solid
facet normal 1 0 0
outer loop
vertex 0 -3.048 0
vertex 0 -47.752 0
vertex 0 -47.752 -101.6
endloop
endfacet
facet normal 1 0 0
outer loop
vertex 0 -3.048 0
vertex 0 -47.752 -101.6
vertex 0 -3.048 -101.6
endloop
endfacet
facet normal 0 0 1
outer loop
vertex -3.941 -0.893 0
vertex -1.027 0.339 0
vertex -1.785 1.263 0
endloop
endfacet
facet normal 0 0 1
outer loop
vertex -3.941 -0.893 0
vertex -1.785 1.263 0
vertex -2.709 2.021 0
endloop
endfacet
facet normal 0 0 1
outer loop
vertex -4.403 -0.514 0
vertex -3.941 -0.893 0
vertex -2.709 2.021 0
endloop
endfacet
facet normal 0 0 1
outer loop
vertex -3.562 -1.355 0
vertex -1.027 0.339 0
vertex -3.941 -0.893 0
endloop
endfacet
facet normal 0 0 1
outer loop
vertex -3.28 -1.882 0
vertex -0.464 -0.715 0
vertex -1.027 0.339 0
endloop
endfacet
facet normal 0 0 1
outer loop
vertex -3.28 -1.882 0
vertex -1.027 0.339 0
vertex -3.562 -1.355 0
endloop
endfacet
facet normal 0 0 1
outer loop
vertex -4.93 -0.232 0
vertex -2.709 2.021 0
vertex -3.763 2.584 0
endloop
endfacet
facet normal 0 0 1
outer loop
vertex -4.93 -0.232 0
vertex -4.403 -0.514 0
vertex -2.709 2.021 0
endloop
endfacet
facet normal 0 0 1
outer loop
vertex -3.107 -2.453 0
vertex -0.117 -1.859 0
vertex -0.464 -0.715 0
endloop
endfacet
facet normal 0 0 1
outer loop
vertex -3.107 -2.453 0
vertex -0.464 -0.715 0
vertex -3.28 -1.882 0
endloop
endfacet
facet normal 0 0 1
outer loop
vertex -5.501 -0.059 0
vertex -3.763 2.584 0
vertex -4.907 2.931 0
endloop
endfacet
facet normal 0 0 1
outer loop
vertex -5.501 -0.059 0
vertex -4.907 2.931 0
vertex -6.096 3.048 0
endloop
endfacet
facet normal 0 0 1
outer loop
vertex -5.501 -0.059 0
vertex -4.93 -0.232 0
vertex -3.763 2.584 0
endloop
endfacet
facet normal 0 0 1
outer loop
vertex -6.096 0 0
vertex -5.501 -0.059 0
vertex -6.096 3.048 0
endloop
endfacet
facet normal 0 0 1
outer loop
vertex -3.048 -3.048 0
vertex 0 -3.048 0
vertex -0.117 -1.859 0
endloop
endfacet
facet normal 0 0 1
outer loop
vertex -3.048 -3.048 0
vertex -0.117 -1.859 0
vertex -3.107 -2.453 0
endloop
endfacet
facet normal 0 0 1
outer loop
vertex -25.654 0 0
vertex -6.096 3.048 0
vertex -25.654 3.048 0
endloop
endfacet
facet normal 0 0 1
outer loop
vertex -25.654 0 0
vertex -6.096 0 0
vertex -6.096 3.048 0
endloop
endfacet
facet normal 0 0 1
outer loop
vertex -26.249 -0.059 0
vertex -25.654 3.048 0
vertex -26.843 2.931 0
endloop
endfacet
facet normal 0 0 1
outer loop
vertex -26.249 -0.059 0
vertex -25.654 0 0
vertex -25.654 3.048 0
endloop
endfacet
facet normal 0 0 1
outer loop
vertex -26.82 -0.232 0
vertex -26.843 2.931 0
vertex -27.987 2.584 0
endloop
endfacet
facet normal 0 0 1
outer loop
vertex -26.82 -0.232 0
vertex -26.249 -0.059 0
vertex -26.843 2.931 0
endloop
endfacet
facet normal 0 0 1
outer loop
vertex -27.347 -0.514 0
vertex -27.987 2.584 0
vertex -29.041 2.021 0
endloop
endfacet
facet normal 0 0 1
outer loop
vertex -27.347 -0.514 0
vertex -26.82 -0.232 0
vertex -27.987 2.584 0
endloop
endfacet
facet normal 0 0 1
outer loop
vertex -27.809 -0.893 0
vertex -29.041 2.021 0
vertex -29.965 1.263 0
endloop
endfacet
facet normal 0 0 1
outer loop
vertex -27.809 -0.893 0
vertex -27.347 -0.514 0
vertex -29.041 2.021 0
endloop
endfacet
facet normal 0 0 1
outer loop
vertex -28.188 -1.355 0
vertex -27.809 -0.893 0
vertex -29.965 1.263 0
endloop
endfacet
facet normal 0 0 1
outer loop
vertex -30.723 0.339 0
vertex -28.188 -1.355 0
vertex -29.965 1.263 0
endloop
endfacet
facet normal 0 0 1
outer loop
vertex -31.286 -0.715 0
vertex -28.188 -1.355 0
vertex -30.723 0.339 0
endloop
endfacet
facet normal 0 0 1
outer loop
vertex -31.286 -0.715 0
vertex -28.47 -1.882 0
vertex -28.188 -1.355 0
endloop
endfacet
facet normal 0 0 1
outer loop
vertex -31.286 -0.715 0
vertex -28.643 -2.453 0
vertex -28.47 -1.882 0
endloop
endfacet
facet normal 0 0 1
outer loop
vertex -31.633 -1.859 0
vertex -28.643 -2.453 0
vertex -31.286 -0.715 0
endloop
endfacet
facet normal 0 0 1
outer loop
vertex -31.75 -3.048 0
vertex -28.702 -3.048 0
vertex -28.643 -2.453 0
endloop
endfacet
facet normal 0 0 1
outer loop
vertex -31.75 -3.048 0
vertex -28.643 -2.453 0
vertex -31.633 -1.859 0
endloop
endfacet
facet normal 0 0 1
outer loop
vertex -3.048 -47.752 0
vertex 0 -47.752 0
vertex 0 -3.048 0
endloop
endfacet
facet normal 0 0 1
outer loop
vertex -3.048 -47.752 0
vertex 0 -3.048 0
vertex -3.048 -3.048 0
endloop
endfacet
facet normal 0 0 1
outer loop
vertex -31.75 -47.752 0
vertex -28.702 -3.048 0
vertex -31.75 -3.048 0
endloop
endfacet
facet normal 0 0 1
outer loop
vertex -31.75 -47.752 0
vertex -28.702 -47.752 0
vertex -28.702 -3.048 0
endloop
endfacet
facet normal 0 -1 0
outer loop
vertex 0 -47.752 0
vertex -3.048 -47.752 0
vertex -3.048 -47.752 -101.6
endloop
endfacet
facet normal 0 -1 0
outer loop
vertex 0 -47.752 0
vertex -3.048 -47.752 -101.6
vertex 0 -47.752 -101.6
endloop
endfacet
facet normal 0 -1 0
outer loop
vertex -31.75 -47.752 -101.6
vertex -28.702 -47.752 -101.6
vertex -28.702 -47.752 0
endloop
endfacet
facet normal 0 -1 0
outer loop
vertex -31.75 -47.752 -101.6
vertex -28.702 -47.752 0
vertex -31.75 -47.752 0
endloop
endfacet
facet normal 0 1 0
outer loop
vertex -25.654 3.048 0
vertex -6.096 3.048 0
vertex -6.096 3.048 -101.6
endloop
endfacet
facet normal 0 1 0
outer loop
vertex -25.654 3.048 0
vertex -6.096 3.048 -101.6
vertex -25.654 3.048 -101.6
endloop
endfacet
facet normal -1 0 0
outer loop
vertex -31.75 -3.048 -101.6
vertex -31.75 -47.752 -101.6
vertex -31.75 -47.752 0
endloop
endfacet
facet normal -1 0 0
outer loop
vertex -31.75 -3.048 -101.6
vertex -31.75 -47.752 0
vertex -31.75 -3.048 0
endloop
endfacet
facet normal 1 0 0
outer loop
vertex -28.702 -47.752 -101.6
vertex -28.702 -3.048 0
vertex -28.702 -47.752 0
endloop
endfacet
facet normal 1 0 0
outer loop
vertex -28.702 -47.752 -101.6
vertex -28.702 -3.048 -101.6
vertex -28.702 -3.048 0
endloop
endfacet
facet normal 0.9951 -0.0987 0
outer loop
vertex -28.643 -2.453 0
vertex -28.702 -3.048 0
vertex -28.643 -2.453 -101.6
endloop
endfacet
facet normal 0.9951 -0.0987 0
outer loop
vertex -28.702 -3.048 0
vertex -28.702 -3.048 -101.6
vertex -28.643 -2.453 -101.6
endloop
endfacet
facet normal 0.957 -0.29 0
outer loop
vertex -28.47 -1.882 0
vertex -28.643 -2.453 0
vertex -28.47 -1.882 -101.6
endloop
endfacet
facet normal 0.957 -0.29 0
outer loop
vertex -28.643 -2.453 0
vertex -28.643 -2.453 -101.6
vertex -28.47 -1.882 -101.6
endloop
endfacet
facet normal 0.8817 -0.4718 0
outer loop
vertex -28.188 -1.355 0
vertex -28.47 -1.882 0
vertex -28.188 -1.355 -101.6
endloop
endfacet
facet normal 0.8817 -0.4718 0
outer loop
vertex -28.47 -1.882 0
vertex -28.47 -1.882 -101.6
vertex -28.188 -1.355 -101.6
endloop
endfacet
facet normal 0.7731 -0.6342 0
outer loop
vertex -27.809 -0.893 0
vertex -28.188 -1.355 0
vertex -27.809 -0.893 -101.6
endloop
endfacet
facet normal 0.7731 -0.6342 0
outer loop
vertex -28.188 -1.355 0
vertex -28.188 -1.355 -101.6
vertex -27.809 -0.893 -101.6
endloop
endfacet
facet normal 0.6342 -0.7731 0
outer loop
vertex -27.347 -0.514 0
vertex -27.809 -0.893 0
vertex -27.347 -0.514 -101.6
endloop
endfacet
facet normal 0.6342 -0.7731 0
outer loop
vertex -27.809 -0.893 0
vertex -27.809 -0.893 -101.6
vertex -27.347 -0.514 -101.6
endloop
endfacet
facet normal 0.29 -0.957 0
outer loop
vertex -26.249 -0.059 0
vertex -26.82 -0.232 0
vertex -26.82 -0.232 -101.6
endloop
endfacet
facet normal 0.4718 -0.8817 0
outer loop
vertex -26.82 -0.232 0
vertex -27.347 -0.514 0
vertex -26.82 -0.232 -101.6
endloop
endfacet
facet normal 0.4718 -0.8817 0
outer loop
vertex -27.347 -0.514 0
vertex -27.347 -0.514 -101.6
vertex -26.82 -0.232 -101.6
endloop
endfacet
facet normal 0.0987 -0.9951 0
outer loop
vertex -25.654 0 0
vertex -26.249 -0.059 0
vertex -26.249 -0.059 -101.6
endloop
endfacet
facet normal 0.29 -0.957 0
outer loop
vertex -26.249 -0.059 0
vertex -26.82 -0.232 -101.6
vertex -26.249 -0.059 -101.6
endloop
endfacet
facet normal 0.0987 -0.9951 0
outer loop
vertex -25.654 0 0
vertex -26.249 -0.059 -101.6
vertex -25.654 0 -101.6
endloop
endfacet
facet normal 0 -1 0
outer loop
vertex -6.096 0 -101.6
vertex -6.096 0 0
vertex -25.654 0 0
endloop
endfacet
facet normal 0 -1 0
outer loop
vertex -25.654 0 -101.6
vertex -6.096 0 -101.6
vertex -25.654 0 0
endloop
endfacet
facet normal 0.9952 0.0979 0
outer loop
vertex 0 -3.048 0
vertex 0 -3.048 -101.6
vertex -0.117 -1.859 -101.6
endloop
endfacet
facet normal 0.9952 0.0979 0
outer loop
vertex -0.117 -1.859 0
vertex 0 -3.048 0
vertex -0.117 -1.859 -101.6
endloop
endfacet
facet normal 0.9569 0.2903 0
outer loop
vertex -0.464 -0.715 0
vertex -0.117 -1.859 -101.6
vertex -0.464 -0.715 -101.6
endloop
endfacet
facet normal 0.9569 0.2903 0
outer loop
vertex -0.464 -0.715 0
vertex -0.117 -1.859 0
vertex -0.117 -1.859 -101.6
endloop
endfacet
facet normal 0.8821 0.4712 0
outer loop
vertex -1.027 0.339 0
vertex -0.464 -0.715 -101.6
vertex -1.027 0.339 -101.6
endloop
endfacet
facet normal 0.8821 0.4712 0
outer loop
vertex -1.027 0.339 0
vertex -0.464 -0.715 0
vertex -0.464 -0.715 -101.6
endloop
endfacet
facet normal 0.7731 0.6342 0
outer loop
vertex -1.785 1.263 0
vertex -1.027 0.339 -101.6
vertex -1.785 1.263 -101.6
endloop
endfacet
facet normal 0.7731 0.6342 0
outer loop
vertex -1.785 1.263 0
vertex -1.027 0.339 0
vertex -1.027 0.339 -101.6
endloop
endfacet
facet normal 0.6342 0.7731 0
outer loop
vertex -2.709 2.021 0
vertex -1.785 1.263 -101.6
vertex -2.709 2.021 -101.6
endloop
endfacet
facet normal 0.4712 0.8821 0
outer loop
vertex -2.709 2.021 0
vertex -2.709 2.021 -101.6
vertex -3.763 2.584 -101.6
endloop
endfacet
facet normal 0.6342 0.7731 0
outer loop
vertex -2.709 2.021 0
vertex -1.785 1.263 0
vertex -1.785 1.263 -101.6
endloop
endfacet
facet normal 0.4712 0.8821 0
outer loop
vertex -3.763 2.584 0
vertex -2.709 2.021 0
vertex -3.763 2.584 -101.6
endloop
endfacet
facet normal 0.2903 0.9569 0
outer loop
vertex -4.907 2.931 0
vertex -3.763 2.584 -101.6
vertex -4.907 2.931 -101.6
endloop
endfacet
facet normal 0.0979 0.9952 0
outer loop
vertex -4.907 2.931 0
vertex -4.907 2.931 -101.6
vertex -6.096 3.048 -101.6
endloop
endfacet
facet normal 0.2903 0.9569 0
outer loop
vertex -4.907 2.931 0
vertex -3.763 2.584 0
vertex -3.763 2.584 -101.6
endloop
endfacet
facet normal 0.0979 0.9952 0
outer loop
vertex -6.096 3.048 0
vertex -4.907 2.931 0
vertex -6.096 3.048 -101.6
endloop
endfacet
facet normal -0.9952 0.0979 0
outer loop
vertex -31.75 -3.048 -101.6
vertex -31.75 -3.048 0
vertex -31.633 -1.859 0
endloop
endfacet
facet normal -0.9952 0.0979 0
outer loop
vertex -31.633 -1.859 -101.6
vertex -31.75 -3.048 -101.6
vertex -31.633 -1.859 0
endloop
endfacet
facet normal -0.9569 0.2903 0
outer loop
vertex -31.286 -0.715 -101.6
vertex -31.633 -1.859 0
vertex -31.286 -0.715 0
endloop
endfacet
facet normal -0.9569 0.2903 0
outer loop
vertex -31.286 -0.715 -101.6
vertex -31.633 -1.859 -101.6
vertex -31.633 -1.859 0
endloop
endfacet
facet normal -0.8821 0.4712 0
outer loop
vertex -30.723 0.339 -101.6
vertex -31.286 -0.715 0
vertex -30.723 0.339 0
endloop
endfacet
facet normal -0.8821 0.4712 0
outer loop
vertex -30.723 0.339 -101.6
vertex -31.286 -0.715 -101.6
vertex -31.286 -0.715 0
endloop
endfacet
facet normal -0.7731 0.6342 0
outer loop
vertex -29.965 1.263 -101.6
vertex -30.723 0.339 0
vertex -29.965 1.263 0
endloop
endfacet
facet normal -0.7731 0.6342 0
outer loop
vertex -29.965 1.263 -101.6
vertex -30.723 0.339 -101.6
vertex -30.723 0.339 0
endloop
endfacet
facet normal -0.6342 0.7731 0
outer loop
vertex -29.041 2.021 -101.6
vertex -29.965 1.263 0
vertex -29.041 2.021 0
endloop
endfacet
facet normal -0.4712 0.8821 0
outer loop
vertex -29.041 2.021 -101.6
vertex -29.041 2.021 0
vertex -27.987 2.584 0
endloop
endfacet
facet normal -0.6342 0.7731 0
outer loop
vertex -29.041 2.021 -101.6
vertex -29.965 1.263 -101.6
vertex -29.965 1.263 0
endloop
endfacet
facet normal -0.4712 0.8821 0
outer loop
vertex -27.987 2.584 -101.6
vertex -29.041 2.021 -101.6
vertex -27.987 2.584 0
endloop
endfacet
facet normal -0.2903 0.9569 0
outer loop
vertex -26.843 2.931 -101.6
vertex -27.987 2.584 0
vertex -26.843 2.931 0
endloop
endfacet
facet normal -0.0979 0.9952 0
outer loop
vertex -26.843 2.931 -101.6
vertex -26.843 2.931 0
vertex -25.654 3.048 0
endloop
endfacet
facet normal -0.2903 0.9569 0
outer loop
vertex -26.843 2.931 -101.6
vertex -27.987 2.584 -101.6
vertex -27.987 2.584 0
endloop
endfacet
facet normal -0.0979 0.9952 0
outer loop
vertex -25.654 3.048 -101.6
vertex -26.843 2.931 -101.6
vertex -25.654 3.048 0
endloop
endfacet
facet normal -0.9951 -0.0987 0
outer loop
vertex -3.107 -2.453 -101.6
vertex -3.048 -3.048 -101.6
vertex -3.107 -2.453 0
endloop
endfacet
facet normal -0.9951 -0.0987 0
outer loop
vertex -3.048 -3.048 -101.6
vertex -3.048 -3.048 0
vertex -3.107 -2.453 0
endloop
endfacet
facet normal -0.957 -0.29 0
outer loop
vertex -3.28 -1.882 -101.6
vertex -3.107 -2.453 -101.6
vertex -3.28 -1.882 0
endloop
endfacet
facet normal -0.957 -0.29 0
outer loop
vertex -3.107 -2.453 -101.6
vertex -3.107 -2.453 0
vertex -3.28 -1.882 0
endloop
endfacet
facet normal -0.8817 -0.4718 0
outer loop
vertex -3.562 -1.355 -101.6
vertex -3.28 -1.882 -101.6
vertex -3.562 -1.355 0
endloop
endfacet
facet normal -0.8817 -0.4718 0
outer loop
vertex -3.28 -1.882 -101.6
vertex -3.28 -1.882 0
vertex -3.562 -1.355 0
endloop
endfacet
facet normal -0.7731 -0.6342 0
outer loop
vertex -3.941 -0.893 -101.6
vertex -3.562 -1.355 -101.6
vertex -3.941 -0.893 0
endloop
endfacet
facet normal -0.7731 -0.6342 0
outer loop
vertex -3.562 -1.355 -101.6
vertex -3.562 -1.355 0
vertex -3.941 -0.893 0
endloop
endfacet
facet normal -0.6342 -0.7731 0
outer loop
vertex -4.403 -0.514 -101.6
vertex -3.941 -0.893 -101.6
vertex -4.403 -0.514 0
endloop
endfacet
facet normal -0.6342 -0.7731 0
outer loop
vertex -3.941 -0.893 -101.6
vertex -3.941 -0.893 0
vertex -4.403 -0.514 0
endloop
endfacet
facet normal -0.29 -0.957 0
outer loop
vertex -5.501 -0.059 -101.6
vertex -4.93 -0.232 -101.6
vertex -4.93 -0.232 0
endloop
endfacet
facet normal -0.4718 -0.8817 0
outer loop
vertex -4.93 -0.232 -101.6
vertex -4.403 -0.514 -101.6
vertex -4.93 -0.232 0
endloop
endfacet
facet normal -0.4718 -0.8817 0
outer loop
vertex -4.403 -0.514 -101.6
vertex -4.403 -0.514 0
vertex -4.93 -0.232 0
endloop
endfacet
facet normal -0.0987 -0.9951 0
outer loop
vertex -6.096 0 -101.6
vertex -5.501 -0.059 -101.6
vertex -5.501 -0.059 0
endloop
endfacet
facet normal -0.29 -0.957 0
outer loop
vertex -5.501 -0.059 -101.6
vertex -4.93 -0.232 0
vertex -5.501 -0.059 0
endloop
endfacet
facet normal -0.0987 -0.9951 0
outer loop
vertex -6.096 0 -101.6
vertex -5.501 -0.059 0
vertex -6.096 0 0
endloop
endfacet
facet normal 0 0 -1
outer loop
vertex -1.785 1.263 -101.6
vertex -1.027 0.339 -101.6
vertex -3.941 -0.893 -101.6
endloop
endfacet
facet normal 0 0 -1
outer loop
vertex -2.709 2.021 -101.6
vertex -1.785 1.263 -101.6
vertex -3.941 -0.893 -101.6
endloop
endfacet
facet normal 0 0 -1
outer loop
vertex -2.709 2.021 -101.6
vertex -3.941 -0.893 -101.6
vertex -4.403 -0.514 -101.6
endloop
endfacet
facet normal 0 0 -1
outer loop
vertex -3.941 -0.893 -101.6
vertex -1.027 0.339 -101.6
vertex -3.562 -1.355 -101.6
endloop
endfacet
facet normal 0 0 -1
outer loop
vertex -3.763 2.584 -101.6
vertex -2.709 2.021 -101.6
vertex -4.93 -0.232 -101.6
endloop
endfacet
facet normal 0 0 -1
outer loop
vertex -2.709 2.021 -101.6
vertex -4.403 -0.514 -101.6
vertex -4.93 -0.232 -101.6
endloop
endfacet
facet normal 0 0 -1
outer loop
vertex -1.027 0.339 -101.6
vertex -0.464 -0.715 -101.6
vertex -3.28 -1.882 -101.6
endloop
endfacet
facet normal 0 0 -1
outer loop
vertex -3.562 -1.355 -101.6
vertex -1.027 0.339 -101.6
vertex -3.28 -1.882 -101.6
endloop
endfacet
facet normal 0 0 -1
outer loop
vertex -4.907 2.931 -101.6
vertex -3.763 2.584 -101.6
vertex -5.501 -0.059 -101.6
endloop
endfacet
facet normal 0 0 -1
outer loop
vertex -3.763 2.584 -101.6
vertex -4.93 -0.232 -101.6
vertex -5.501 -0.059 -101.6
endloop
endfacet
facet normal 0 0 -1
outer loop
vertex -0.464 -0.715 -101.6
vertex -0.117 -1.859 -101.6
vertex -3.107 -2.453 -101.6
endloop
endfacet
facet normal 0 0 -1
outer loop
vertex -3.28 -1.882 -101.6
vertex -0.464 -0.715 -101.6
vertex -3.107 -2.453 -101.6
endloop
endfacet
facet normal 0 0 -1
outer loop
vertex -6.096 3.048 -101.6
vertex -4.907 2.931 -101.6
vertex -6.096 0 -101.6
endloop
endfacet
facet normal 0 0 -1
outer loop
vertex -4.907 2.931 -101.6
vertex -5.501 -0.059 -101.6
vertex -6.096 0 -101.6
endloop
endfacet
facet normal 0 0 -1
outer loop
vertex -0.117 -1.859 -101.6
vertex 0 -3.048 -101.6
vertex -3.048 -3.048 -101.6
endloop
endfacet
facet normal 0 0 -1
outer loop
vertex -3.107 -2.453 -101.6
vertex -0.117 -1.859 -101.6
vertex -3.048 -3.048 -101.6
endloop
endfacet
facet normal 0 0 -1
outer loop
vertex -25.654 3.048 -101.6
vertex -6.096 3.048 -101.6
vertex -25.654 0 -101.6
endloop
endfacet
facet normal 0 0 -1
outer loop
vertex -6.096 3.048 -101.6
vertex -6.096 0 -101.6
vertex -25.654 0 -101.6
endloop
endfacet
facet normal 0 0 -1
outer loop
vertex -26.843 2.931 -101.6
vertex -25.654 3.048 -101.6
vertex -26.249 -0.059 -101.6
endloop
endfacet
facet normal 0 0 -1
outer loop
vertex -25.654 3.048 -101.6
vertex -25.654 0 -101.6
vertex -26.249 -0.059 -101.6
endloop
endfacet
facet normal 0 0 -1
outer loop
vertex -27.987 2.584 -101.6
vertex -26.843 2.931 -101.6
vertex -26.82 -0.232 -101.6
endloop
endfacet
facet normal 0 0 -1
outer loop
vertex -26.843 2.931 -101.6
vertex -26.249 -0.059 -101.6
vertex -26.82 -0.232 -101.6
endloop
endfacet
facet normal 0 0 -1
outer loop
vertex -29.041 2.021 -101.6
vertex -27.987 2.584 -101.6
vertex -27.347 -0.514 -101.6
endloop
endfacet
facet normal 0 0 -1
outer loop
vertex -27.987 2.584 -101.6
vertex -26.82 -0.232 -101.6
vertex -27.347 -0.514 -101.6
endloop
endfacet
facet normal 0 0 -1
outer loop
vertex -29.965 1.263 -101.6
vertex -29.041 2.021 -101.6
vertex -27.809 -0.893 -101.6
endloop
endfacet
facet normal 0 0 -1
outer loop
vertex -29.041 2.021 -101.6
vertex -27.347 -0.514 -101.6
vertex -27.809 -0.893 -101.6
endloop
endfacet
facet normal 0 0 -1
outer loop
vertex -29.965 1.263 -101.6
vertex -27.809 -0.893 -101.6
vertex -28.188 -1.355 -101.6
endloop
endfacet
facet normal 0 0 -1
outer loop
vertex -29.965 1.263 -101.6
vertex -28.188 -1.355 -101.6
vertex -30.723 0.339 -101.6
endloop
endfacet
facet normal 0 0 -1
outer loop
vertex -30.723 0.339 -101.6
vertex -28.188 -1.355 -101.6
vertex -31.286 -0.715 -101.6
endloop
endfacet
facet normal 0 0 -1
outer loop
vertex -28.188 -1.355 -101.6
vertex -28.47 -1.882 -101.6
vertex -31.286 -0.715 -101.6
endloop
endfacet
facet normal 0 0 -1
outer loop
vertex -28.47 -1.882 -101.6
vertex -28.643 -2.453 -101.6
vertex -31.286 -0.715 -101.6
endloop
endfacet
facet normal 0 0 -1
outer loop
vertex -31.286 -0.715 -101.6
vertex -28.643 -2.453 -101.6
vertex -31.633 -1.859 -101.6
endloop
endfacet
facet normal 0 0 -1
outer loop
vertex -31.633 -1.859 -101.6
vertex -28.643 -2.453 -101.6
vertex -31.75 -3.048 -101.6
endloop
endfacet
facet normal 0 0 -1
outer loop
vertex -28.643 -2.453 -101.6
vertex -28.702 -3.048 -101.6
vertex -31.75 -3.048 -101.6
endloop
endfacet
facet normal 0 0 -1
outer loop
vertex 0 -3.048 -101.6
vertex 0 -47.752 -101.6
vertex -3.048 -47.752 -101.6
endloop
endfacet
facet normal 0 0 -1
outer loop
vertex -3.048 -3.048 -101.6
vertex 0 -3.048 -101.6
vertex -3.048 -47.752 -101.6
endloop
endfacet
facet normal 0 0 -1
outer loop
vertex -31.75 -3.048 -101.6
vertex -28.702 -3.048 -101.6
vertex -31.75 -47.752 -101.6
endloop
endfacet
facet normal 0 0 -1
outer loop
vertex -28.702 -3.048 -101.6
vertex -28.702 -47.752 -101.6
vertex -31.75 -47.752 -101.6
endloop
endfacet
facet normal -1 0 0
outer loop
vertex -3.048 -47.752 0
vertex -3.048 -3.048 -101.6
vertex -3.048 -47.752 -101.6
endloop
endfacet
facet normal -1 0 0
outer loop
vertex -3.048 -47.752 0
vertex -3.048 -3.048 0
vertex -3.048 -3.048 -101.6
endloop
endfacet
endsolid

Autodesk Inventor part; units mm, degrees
ref_plane "YZ Plane" through (0, 0, 0) normal (1, 0, 0) x (0, 1, 0)
ref_plane "XZ Plane" through (0, 0, 0) normal (0, 1, 0) x (-1, 0, 0)
ref_plane "XY Plane" through (0, 0, 0) normal (0, 0, 1) x (1, 0, 0)
sketch "Sketch1" plane through (0, 0, 0) normal (0, 1, 0) x (-1, 0, 0)
  line L0 (0, 0) -> (31.75, 0)
  line L1 (31.75, 0) -> (31.75, -101.6)
  line L2 (31.75, -101.6) -> (0, -101.6)
  line L3 (0, -101.6) -> (0, 0)
  dimension "d0" = 31.75
  dimension "d1" = 101.6
extrude "Plate1" add sketch "Sketch1" along normal blind 3.048
sketch "Sketch2" plane through (-3.048, 3.048, 0) normal (1, 0, 0) x (0, 1, 0)
  line L0 (0, -101.6) -> (0, 0)
  line L1 (0, 0) -> (-50.8, 0)
  line L2 (-50.8, 0) -> (-50.8, -101.6)
  line L3 (-50.8, -101.6) -> (0, -101.6)
edge flange "Flange1" height 50.8 angle 90 thickness 3.048 bend radius 3.048 thickness toward (1, 0, 0) relief tear relief width 3.048 relief depth 1.524 corner gap 3.048 corner form 0 edges at (0, 0, -50.8) (-31.75, 0, -50.8) wall of the first edge with corners at (-3.048, 3.048, -101.6) (-3.048, 3.048, 0) (-3.048, -47.752, 0) (-3.048, -47.752, -101.6)
bend "Bend1"
corner "Corner1"
equation "\"d3\" = BendReliefWidth"
equation "\"d4\" = BendReliefDepth"
equation "\"d5\" = MinimumRemnant"
equation "\"d6\" = BendRadius"
equation "\"d9\" = BendRadius"
equation "\"d10\" = CornerReliefSize"
equation "\"d11\" = GapSize"
equation "\"d12\" = JacobiRadiusSize"
equation "\"BendRadius\" = Thickness"
equation "\"BendReliefWidth\" = Thickness"
equation "\"BendReliefDepth\" = 0.5 * Thickness"
equation "\"CornerReliefSize\" = 4 * Thickness"
equation "\"MinimumRemnant\" = 2 * Thickness"
equation "\"TransitionRadius\" = BendRadius"
equation "\"JacobiRadiusSize\" = BendRadius"
equation "\"GapSize\" = Thickness"
equation "\"d2\" = BendRadius"
equation "\"Thickness\" = 3.048"
properties part number "aFrameBrace1"
